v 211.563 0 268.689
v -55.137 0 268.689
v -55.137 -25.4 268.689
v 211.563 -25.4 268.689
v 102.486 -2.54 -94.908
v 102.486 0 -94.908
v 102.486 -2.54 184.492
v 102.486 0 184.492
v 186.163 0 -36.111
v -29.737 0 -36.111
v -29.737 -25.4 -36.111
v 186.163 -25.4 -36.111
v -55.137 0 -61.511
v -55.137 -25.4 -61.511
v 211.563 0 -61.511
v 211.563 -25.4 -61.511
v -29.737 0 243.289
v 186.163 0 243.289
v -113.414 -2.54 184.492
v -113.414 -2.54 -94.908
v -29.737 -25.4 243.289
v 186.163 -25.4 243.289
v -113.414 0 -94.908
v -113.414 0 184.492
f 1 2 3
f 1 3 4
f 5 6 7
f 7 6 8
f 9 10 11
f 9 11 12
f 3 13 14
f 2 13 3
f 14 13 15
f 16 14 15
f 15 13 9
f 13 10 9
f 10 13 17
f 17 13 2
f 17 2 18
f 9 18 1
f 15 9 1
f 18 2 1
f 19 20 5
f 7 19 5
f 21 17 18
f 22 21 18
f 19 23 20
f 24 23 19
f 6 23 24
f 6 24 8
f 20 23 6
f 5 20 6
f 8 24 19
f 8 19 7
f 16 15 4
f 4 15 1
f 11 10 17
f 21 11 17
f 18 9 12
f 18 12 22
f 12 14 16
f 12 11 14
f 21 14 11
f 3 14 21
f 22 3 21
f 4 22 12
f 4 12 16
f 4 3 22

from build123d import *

# Parameters (mm, degrees)
F0_W     = 266.7
F0_H     = 330.2
F0_W_2   = 215.9
F0_H_2   = 279.4
F1_DEPTH = 25.4
F2_W     = 215.9
F2_H     = 279.4
F3_DEPTH = 2.54


with BuildPart() as f1:
    # F0 (on Front) → F1 (new body)
    with BuildSketch(Plane.XZ):
        with Locations((78.213416, 103.588632)):
            Rectangle(F0_W, F0_H)
        with Locations((78.213416, 103.588632)):
            Rectangle(F0_W_2, F0_H_2, mode=Mode.SUBTRACT)
    extrude(amount=F1_DEPTH)


with BuildPart() as f3:
    # F2 (on Front) → F3 (new body)
    with BuildSketch(Plane.XZ):
        with Locations((-5.464097, 44.792147)):
            Rectangle(F2_W, F2_H)
    extrude(amount=F3_DEPTH)


solid = Compound([f1.part, f3.part])
